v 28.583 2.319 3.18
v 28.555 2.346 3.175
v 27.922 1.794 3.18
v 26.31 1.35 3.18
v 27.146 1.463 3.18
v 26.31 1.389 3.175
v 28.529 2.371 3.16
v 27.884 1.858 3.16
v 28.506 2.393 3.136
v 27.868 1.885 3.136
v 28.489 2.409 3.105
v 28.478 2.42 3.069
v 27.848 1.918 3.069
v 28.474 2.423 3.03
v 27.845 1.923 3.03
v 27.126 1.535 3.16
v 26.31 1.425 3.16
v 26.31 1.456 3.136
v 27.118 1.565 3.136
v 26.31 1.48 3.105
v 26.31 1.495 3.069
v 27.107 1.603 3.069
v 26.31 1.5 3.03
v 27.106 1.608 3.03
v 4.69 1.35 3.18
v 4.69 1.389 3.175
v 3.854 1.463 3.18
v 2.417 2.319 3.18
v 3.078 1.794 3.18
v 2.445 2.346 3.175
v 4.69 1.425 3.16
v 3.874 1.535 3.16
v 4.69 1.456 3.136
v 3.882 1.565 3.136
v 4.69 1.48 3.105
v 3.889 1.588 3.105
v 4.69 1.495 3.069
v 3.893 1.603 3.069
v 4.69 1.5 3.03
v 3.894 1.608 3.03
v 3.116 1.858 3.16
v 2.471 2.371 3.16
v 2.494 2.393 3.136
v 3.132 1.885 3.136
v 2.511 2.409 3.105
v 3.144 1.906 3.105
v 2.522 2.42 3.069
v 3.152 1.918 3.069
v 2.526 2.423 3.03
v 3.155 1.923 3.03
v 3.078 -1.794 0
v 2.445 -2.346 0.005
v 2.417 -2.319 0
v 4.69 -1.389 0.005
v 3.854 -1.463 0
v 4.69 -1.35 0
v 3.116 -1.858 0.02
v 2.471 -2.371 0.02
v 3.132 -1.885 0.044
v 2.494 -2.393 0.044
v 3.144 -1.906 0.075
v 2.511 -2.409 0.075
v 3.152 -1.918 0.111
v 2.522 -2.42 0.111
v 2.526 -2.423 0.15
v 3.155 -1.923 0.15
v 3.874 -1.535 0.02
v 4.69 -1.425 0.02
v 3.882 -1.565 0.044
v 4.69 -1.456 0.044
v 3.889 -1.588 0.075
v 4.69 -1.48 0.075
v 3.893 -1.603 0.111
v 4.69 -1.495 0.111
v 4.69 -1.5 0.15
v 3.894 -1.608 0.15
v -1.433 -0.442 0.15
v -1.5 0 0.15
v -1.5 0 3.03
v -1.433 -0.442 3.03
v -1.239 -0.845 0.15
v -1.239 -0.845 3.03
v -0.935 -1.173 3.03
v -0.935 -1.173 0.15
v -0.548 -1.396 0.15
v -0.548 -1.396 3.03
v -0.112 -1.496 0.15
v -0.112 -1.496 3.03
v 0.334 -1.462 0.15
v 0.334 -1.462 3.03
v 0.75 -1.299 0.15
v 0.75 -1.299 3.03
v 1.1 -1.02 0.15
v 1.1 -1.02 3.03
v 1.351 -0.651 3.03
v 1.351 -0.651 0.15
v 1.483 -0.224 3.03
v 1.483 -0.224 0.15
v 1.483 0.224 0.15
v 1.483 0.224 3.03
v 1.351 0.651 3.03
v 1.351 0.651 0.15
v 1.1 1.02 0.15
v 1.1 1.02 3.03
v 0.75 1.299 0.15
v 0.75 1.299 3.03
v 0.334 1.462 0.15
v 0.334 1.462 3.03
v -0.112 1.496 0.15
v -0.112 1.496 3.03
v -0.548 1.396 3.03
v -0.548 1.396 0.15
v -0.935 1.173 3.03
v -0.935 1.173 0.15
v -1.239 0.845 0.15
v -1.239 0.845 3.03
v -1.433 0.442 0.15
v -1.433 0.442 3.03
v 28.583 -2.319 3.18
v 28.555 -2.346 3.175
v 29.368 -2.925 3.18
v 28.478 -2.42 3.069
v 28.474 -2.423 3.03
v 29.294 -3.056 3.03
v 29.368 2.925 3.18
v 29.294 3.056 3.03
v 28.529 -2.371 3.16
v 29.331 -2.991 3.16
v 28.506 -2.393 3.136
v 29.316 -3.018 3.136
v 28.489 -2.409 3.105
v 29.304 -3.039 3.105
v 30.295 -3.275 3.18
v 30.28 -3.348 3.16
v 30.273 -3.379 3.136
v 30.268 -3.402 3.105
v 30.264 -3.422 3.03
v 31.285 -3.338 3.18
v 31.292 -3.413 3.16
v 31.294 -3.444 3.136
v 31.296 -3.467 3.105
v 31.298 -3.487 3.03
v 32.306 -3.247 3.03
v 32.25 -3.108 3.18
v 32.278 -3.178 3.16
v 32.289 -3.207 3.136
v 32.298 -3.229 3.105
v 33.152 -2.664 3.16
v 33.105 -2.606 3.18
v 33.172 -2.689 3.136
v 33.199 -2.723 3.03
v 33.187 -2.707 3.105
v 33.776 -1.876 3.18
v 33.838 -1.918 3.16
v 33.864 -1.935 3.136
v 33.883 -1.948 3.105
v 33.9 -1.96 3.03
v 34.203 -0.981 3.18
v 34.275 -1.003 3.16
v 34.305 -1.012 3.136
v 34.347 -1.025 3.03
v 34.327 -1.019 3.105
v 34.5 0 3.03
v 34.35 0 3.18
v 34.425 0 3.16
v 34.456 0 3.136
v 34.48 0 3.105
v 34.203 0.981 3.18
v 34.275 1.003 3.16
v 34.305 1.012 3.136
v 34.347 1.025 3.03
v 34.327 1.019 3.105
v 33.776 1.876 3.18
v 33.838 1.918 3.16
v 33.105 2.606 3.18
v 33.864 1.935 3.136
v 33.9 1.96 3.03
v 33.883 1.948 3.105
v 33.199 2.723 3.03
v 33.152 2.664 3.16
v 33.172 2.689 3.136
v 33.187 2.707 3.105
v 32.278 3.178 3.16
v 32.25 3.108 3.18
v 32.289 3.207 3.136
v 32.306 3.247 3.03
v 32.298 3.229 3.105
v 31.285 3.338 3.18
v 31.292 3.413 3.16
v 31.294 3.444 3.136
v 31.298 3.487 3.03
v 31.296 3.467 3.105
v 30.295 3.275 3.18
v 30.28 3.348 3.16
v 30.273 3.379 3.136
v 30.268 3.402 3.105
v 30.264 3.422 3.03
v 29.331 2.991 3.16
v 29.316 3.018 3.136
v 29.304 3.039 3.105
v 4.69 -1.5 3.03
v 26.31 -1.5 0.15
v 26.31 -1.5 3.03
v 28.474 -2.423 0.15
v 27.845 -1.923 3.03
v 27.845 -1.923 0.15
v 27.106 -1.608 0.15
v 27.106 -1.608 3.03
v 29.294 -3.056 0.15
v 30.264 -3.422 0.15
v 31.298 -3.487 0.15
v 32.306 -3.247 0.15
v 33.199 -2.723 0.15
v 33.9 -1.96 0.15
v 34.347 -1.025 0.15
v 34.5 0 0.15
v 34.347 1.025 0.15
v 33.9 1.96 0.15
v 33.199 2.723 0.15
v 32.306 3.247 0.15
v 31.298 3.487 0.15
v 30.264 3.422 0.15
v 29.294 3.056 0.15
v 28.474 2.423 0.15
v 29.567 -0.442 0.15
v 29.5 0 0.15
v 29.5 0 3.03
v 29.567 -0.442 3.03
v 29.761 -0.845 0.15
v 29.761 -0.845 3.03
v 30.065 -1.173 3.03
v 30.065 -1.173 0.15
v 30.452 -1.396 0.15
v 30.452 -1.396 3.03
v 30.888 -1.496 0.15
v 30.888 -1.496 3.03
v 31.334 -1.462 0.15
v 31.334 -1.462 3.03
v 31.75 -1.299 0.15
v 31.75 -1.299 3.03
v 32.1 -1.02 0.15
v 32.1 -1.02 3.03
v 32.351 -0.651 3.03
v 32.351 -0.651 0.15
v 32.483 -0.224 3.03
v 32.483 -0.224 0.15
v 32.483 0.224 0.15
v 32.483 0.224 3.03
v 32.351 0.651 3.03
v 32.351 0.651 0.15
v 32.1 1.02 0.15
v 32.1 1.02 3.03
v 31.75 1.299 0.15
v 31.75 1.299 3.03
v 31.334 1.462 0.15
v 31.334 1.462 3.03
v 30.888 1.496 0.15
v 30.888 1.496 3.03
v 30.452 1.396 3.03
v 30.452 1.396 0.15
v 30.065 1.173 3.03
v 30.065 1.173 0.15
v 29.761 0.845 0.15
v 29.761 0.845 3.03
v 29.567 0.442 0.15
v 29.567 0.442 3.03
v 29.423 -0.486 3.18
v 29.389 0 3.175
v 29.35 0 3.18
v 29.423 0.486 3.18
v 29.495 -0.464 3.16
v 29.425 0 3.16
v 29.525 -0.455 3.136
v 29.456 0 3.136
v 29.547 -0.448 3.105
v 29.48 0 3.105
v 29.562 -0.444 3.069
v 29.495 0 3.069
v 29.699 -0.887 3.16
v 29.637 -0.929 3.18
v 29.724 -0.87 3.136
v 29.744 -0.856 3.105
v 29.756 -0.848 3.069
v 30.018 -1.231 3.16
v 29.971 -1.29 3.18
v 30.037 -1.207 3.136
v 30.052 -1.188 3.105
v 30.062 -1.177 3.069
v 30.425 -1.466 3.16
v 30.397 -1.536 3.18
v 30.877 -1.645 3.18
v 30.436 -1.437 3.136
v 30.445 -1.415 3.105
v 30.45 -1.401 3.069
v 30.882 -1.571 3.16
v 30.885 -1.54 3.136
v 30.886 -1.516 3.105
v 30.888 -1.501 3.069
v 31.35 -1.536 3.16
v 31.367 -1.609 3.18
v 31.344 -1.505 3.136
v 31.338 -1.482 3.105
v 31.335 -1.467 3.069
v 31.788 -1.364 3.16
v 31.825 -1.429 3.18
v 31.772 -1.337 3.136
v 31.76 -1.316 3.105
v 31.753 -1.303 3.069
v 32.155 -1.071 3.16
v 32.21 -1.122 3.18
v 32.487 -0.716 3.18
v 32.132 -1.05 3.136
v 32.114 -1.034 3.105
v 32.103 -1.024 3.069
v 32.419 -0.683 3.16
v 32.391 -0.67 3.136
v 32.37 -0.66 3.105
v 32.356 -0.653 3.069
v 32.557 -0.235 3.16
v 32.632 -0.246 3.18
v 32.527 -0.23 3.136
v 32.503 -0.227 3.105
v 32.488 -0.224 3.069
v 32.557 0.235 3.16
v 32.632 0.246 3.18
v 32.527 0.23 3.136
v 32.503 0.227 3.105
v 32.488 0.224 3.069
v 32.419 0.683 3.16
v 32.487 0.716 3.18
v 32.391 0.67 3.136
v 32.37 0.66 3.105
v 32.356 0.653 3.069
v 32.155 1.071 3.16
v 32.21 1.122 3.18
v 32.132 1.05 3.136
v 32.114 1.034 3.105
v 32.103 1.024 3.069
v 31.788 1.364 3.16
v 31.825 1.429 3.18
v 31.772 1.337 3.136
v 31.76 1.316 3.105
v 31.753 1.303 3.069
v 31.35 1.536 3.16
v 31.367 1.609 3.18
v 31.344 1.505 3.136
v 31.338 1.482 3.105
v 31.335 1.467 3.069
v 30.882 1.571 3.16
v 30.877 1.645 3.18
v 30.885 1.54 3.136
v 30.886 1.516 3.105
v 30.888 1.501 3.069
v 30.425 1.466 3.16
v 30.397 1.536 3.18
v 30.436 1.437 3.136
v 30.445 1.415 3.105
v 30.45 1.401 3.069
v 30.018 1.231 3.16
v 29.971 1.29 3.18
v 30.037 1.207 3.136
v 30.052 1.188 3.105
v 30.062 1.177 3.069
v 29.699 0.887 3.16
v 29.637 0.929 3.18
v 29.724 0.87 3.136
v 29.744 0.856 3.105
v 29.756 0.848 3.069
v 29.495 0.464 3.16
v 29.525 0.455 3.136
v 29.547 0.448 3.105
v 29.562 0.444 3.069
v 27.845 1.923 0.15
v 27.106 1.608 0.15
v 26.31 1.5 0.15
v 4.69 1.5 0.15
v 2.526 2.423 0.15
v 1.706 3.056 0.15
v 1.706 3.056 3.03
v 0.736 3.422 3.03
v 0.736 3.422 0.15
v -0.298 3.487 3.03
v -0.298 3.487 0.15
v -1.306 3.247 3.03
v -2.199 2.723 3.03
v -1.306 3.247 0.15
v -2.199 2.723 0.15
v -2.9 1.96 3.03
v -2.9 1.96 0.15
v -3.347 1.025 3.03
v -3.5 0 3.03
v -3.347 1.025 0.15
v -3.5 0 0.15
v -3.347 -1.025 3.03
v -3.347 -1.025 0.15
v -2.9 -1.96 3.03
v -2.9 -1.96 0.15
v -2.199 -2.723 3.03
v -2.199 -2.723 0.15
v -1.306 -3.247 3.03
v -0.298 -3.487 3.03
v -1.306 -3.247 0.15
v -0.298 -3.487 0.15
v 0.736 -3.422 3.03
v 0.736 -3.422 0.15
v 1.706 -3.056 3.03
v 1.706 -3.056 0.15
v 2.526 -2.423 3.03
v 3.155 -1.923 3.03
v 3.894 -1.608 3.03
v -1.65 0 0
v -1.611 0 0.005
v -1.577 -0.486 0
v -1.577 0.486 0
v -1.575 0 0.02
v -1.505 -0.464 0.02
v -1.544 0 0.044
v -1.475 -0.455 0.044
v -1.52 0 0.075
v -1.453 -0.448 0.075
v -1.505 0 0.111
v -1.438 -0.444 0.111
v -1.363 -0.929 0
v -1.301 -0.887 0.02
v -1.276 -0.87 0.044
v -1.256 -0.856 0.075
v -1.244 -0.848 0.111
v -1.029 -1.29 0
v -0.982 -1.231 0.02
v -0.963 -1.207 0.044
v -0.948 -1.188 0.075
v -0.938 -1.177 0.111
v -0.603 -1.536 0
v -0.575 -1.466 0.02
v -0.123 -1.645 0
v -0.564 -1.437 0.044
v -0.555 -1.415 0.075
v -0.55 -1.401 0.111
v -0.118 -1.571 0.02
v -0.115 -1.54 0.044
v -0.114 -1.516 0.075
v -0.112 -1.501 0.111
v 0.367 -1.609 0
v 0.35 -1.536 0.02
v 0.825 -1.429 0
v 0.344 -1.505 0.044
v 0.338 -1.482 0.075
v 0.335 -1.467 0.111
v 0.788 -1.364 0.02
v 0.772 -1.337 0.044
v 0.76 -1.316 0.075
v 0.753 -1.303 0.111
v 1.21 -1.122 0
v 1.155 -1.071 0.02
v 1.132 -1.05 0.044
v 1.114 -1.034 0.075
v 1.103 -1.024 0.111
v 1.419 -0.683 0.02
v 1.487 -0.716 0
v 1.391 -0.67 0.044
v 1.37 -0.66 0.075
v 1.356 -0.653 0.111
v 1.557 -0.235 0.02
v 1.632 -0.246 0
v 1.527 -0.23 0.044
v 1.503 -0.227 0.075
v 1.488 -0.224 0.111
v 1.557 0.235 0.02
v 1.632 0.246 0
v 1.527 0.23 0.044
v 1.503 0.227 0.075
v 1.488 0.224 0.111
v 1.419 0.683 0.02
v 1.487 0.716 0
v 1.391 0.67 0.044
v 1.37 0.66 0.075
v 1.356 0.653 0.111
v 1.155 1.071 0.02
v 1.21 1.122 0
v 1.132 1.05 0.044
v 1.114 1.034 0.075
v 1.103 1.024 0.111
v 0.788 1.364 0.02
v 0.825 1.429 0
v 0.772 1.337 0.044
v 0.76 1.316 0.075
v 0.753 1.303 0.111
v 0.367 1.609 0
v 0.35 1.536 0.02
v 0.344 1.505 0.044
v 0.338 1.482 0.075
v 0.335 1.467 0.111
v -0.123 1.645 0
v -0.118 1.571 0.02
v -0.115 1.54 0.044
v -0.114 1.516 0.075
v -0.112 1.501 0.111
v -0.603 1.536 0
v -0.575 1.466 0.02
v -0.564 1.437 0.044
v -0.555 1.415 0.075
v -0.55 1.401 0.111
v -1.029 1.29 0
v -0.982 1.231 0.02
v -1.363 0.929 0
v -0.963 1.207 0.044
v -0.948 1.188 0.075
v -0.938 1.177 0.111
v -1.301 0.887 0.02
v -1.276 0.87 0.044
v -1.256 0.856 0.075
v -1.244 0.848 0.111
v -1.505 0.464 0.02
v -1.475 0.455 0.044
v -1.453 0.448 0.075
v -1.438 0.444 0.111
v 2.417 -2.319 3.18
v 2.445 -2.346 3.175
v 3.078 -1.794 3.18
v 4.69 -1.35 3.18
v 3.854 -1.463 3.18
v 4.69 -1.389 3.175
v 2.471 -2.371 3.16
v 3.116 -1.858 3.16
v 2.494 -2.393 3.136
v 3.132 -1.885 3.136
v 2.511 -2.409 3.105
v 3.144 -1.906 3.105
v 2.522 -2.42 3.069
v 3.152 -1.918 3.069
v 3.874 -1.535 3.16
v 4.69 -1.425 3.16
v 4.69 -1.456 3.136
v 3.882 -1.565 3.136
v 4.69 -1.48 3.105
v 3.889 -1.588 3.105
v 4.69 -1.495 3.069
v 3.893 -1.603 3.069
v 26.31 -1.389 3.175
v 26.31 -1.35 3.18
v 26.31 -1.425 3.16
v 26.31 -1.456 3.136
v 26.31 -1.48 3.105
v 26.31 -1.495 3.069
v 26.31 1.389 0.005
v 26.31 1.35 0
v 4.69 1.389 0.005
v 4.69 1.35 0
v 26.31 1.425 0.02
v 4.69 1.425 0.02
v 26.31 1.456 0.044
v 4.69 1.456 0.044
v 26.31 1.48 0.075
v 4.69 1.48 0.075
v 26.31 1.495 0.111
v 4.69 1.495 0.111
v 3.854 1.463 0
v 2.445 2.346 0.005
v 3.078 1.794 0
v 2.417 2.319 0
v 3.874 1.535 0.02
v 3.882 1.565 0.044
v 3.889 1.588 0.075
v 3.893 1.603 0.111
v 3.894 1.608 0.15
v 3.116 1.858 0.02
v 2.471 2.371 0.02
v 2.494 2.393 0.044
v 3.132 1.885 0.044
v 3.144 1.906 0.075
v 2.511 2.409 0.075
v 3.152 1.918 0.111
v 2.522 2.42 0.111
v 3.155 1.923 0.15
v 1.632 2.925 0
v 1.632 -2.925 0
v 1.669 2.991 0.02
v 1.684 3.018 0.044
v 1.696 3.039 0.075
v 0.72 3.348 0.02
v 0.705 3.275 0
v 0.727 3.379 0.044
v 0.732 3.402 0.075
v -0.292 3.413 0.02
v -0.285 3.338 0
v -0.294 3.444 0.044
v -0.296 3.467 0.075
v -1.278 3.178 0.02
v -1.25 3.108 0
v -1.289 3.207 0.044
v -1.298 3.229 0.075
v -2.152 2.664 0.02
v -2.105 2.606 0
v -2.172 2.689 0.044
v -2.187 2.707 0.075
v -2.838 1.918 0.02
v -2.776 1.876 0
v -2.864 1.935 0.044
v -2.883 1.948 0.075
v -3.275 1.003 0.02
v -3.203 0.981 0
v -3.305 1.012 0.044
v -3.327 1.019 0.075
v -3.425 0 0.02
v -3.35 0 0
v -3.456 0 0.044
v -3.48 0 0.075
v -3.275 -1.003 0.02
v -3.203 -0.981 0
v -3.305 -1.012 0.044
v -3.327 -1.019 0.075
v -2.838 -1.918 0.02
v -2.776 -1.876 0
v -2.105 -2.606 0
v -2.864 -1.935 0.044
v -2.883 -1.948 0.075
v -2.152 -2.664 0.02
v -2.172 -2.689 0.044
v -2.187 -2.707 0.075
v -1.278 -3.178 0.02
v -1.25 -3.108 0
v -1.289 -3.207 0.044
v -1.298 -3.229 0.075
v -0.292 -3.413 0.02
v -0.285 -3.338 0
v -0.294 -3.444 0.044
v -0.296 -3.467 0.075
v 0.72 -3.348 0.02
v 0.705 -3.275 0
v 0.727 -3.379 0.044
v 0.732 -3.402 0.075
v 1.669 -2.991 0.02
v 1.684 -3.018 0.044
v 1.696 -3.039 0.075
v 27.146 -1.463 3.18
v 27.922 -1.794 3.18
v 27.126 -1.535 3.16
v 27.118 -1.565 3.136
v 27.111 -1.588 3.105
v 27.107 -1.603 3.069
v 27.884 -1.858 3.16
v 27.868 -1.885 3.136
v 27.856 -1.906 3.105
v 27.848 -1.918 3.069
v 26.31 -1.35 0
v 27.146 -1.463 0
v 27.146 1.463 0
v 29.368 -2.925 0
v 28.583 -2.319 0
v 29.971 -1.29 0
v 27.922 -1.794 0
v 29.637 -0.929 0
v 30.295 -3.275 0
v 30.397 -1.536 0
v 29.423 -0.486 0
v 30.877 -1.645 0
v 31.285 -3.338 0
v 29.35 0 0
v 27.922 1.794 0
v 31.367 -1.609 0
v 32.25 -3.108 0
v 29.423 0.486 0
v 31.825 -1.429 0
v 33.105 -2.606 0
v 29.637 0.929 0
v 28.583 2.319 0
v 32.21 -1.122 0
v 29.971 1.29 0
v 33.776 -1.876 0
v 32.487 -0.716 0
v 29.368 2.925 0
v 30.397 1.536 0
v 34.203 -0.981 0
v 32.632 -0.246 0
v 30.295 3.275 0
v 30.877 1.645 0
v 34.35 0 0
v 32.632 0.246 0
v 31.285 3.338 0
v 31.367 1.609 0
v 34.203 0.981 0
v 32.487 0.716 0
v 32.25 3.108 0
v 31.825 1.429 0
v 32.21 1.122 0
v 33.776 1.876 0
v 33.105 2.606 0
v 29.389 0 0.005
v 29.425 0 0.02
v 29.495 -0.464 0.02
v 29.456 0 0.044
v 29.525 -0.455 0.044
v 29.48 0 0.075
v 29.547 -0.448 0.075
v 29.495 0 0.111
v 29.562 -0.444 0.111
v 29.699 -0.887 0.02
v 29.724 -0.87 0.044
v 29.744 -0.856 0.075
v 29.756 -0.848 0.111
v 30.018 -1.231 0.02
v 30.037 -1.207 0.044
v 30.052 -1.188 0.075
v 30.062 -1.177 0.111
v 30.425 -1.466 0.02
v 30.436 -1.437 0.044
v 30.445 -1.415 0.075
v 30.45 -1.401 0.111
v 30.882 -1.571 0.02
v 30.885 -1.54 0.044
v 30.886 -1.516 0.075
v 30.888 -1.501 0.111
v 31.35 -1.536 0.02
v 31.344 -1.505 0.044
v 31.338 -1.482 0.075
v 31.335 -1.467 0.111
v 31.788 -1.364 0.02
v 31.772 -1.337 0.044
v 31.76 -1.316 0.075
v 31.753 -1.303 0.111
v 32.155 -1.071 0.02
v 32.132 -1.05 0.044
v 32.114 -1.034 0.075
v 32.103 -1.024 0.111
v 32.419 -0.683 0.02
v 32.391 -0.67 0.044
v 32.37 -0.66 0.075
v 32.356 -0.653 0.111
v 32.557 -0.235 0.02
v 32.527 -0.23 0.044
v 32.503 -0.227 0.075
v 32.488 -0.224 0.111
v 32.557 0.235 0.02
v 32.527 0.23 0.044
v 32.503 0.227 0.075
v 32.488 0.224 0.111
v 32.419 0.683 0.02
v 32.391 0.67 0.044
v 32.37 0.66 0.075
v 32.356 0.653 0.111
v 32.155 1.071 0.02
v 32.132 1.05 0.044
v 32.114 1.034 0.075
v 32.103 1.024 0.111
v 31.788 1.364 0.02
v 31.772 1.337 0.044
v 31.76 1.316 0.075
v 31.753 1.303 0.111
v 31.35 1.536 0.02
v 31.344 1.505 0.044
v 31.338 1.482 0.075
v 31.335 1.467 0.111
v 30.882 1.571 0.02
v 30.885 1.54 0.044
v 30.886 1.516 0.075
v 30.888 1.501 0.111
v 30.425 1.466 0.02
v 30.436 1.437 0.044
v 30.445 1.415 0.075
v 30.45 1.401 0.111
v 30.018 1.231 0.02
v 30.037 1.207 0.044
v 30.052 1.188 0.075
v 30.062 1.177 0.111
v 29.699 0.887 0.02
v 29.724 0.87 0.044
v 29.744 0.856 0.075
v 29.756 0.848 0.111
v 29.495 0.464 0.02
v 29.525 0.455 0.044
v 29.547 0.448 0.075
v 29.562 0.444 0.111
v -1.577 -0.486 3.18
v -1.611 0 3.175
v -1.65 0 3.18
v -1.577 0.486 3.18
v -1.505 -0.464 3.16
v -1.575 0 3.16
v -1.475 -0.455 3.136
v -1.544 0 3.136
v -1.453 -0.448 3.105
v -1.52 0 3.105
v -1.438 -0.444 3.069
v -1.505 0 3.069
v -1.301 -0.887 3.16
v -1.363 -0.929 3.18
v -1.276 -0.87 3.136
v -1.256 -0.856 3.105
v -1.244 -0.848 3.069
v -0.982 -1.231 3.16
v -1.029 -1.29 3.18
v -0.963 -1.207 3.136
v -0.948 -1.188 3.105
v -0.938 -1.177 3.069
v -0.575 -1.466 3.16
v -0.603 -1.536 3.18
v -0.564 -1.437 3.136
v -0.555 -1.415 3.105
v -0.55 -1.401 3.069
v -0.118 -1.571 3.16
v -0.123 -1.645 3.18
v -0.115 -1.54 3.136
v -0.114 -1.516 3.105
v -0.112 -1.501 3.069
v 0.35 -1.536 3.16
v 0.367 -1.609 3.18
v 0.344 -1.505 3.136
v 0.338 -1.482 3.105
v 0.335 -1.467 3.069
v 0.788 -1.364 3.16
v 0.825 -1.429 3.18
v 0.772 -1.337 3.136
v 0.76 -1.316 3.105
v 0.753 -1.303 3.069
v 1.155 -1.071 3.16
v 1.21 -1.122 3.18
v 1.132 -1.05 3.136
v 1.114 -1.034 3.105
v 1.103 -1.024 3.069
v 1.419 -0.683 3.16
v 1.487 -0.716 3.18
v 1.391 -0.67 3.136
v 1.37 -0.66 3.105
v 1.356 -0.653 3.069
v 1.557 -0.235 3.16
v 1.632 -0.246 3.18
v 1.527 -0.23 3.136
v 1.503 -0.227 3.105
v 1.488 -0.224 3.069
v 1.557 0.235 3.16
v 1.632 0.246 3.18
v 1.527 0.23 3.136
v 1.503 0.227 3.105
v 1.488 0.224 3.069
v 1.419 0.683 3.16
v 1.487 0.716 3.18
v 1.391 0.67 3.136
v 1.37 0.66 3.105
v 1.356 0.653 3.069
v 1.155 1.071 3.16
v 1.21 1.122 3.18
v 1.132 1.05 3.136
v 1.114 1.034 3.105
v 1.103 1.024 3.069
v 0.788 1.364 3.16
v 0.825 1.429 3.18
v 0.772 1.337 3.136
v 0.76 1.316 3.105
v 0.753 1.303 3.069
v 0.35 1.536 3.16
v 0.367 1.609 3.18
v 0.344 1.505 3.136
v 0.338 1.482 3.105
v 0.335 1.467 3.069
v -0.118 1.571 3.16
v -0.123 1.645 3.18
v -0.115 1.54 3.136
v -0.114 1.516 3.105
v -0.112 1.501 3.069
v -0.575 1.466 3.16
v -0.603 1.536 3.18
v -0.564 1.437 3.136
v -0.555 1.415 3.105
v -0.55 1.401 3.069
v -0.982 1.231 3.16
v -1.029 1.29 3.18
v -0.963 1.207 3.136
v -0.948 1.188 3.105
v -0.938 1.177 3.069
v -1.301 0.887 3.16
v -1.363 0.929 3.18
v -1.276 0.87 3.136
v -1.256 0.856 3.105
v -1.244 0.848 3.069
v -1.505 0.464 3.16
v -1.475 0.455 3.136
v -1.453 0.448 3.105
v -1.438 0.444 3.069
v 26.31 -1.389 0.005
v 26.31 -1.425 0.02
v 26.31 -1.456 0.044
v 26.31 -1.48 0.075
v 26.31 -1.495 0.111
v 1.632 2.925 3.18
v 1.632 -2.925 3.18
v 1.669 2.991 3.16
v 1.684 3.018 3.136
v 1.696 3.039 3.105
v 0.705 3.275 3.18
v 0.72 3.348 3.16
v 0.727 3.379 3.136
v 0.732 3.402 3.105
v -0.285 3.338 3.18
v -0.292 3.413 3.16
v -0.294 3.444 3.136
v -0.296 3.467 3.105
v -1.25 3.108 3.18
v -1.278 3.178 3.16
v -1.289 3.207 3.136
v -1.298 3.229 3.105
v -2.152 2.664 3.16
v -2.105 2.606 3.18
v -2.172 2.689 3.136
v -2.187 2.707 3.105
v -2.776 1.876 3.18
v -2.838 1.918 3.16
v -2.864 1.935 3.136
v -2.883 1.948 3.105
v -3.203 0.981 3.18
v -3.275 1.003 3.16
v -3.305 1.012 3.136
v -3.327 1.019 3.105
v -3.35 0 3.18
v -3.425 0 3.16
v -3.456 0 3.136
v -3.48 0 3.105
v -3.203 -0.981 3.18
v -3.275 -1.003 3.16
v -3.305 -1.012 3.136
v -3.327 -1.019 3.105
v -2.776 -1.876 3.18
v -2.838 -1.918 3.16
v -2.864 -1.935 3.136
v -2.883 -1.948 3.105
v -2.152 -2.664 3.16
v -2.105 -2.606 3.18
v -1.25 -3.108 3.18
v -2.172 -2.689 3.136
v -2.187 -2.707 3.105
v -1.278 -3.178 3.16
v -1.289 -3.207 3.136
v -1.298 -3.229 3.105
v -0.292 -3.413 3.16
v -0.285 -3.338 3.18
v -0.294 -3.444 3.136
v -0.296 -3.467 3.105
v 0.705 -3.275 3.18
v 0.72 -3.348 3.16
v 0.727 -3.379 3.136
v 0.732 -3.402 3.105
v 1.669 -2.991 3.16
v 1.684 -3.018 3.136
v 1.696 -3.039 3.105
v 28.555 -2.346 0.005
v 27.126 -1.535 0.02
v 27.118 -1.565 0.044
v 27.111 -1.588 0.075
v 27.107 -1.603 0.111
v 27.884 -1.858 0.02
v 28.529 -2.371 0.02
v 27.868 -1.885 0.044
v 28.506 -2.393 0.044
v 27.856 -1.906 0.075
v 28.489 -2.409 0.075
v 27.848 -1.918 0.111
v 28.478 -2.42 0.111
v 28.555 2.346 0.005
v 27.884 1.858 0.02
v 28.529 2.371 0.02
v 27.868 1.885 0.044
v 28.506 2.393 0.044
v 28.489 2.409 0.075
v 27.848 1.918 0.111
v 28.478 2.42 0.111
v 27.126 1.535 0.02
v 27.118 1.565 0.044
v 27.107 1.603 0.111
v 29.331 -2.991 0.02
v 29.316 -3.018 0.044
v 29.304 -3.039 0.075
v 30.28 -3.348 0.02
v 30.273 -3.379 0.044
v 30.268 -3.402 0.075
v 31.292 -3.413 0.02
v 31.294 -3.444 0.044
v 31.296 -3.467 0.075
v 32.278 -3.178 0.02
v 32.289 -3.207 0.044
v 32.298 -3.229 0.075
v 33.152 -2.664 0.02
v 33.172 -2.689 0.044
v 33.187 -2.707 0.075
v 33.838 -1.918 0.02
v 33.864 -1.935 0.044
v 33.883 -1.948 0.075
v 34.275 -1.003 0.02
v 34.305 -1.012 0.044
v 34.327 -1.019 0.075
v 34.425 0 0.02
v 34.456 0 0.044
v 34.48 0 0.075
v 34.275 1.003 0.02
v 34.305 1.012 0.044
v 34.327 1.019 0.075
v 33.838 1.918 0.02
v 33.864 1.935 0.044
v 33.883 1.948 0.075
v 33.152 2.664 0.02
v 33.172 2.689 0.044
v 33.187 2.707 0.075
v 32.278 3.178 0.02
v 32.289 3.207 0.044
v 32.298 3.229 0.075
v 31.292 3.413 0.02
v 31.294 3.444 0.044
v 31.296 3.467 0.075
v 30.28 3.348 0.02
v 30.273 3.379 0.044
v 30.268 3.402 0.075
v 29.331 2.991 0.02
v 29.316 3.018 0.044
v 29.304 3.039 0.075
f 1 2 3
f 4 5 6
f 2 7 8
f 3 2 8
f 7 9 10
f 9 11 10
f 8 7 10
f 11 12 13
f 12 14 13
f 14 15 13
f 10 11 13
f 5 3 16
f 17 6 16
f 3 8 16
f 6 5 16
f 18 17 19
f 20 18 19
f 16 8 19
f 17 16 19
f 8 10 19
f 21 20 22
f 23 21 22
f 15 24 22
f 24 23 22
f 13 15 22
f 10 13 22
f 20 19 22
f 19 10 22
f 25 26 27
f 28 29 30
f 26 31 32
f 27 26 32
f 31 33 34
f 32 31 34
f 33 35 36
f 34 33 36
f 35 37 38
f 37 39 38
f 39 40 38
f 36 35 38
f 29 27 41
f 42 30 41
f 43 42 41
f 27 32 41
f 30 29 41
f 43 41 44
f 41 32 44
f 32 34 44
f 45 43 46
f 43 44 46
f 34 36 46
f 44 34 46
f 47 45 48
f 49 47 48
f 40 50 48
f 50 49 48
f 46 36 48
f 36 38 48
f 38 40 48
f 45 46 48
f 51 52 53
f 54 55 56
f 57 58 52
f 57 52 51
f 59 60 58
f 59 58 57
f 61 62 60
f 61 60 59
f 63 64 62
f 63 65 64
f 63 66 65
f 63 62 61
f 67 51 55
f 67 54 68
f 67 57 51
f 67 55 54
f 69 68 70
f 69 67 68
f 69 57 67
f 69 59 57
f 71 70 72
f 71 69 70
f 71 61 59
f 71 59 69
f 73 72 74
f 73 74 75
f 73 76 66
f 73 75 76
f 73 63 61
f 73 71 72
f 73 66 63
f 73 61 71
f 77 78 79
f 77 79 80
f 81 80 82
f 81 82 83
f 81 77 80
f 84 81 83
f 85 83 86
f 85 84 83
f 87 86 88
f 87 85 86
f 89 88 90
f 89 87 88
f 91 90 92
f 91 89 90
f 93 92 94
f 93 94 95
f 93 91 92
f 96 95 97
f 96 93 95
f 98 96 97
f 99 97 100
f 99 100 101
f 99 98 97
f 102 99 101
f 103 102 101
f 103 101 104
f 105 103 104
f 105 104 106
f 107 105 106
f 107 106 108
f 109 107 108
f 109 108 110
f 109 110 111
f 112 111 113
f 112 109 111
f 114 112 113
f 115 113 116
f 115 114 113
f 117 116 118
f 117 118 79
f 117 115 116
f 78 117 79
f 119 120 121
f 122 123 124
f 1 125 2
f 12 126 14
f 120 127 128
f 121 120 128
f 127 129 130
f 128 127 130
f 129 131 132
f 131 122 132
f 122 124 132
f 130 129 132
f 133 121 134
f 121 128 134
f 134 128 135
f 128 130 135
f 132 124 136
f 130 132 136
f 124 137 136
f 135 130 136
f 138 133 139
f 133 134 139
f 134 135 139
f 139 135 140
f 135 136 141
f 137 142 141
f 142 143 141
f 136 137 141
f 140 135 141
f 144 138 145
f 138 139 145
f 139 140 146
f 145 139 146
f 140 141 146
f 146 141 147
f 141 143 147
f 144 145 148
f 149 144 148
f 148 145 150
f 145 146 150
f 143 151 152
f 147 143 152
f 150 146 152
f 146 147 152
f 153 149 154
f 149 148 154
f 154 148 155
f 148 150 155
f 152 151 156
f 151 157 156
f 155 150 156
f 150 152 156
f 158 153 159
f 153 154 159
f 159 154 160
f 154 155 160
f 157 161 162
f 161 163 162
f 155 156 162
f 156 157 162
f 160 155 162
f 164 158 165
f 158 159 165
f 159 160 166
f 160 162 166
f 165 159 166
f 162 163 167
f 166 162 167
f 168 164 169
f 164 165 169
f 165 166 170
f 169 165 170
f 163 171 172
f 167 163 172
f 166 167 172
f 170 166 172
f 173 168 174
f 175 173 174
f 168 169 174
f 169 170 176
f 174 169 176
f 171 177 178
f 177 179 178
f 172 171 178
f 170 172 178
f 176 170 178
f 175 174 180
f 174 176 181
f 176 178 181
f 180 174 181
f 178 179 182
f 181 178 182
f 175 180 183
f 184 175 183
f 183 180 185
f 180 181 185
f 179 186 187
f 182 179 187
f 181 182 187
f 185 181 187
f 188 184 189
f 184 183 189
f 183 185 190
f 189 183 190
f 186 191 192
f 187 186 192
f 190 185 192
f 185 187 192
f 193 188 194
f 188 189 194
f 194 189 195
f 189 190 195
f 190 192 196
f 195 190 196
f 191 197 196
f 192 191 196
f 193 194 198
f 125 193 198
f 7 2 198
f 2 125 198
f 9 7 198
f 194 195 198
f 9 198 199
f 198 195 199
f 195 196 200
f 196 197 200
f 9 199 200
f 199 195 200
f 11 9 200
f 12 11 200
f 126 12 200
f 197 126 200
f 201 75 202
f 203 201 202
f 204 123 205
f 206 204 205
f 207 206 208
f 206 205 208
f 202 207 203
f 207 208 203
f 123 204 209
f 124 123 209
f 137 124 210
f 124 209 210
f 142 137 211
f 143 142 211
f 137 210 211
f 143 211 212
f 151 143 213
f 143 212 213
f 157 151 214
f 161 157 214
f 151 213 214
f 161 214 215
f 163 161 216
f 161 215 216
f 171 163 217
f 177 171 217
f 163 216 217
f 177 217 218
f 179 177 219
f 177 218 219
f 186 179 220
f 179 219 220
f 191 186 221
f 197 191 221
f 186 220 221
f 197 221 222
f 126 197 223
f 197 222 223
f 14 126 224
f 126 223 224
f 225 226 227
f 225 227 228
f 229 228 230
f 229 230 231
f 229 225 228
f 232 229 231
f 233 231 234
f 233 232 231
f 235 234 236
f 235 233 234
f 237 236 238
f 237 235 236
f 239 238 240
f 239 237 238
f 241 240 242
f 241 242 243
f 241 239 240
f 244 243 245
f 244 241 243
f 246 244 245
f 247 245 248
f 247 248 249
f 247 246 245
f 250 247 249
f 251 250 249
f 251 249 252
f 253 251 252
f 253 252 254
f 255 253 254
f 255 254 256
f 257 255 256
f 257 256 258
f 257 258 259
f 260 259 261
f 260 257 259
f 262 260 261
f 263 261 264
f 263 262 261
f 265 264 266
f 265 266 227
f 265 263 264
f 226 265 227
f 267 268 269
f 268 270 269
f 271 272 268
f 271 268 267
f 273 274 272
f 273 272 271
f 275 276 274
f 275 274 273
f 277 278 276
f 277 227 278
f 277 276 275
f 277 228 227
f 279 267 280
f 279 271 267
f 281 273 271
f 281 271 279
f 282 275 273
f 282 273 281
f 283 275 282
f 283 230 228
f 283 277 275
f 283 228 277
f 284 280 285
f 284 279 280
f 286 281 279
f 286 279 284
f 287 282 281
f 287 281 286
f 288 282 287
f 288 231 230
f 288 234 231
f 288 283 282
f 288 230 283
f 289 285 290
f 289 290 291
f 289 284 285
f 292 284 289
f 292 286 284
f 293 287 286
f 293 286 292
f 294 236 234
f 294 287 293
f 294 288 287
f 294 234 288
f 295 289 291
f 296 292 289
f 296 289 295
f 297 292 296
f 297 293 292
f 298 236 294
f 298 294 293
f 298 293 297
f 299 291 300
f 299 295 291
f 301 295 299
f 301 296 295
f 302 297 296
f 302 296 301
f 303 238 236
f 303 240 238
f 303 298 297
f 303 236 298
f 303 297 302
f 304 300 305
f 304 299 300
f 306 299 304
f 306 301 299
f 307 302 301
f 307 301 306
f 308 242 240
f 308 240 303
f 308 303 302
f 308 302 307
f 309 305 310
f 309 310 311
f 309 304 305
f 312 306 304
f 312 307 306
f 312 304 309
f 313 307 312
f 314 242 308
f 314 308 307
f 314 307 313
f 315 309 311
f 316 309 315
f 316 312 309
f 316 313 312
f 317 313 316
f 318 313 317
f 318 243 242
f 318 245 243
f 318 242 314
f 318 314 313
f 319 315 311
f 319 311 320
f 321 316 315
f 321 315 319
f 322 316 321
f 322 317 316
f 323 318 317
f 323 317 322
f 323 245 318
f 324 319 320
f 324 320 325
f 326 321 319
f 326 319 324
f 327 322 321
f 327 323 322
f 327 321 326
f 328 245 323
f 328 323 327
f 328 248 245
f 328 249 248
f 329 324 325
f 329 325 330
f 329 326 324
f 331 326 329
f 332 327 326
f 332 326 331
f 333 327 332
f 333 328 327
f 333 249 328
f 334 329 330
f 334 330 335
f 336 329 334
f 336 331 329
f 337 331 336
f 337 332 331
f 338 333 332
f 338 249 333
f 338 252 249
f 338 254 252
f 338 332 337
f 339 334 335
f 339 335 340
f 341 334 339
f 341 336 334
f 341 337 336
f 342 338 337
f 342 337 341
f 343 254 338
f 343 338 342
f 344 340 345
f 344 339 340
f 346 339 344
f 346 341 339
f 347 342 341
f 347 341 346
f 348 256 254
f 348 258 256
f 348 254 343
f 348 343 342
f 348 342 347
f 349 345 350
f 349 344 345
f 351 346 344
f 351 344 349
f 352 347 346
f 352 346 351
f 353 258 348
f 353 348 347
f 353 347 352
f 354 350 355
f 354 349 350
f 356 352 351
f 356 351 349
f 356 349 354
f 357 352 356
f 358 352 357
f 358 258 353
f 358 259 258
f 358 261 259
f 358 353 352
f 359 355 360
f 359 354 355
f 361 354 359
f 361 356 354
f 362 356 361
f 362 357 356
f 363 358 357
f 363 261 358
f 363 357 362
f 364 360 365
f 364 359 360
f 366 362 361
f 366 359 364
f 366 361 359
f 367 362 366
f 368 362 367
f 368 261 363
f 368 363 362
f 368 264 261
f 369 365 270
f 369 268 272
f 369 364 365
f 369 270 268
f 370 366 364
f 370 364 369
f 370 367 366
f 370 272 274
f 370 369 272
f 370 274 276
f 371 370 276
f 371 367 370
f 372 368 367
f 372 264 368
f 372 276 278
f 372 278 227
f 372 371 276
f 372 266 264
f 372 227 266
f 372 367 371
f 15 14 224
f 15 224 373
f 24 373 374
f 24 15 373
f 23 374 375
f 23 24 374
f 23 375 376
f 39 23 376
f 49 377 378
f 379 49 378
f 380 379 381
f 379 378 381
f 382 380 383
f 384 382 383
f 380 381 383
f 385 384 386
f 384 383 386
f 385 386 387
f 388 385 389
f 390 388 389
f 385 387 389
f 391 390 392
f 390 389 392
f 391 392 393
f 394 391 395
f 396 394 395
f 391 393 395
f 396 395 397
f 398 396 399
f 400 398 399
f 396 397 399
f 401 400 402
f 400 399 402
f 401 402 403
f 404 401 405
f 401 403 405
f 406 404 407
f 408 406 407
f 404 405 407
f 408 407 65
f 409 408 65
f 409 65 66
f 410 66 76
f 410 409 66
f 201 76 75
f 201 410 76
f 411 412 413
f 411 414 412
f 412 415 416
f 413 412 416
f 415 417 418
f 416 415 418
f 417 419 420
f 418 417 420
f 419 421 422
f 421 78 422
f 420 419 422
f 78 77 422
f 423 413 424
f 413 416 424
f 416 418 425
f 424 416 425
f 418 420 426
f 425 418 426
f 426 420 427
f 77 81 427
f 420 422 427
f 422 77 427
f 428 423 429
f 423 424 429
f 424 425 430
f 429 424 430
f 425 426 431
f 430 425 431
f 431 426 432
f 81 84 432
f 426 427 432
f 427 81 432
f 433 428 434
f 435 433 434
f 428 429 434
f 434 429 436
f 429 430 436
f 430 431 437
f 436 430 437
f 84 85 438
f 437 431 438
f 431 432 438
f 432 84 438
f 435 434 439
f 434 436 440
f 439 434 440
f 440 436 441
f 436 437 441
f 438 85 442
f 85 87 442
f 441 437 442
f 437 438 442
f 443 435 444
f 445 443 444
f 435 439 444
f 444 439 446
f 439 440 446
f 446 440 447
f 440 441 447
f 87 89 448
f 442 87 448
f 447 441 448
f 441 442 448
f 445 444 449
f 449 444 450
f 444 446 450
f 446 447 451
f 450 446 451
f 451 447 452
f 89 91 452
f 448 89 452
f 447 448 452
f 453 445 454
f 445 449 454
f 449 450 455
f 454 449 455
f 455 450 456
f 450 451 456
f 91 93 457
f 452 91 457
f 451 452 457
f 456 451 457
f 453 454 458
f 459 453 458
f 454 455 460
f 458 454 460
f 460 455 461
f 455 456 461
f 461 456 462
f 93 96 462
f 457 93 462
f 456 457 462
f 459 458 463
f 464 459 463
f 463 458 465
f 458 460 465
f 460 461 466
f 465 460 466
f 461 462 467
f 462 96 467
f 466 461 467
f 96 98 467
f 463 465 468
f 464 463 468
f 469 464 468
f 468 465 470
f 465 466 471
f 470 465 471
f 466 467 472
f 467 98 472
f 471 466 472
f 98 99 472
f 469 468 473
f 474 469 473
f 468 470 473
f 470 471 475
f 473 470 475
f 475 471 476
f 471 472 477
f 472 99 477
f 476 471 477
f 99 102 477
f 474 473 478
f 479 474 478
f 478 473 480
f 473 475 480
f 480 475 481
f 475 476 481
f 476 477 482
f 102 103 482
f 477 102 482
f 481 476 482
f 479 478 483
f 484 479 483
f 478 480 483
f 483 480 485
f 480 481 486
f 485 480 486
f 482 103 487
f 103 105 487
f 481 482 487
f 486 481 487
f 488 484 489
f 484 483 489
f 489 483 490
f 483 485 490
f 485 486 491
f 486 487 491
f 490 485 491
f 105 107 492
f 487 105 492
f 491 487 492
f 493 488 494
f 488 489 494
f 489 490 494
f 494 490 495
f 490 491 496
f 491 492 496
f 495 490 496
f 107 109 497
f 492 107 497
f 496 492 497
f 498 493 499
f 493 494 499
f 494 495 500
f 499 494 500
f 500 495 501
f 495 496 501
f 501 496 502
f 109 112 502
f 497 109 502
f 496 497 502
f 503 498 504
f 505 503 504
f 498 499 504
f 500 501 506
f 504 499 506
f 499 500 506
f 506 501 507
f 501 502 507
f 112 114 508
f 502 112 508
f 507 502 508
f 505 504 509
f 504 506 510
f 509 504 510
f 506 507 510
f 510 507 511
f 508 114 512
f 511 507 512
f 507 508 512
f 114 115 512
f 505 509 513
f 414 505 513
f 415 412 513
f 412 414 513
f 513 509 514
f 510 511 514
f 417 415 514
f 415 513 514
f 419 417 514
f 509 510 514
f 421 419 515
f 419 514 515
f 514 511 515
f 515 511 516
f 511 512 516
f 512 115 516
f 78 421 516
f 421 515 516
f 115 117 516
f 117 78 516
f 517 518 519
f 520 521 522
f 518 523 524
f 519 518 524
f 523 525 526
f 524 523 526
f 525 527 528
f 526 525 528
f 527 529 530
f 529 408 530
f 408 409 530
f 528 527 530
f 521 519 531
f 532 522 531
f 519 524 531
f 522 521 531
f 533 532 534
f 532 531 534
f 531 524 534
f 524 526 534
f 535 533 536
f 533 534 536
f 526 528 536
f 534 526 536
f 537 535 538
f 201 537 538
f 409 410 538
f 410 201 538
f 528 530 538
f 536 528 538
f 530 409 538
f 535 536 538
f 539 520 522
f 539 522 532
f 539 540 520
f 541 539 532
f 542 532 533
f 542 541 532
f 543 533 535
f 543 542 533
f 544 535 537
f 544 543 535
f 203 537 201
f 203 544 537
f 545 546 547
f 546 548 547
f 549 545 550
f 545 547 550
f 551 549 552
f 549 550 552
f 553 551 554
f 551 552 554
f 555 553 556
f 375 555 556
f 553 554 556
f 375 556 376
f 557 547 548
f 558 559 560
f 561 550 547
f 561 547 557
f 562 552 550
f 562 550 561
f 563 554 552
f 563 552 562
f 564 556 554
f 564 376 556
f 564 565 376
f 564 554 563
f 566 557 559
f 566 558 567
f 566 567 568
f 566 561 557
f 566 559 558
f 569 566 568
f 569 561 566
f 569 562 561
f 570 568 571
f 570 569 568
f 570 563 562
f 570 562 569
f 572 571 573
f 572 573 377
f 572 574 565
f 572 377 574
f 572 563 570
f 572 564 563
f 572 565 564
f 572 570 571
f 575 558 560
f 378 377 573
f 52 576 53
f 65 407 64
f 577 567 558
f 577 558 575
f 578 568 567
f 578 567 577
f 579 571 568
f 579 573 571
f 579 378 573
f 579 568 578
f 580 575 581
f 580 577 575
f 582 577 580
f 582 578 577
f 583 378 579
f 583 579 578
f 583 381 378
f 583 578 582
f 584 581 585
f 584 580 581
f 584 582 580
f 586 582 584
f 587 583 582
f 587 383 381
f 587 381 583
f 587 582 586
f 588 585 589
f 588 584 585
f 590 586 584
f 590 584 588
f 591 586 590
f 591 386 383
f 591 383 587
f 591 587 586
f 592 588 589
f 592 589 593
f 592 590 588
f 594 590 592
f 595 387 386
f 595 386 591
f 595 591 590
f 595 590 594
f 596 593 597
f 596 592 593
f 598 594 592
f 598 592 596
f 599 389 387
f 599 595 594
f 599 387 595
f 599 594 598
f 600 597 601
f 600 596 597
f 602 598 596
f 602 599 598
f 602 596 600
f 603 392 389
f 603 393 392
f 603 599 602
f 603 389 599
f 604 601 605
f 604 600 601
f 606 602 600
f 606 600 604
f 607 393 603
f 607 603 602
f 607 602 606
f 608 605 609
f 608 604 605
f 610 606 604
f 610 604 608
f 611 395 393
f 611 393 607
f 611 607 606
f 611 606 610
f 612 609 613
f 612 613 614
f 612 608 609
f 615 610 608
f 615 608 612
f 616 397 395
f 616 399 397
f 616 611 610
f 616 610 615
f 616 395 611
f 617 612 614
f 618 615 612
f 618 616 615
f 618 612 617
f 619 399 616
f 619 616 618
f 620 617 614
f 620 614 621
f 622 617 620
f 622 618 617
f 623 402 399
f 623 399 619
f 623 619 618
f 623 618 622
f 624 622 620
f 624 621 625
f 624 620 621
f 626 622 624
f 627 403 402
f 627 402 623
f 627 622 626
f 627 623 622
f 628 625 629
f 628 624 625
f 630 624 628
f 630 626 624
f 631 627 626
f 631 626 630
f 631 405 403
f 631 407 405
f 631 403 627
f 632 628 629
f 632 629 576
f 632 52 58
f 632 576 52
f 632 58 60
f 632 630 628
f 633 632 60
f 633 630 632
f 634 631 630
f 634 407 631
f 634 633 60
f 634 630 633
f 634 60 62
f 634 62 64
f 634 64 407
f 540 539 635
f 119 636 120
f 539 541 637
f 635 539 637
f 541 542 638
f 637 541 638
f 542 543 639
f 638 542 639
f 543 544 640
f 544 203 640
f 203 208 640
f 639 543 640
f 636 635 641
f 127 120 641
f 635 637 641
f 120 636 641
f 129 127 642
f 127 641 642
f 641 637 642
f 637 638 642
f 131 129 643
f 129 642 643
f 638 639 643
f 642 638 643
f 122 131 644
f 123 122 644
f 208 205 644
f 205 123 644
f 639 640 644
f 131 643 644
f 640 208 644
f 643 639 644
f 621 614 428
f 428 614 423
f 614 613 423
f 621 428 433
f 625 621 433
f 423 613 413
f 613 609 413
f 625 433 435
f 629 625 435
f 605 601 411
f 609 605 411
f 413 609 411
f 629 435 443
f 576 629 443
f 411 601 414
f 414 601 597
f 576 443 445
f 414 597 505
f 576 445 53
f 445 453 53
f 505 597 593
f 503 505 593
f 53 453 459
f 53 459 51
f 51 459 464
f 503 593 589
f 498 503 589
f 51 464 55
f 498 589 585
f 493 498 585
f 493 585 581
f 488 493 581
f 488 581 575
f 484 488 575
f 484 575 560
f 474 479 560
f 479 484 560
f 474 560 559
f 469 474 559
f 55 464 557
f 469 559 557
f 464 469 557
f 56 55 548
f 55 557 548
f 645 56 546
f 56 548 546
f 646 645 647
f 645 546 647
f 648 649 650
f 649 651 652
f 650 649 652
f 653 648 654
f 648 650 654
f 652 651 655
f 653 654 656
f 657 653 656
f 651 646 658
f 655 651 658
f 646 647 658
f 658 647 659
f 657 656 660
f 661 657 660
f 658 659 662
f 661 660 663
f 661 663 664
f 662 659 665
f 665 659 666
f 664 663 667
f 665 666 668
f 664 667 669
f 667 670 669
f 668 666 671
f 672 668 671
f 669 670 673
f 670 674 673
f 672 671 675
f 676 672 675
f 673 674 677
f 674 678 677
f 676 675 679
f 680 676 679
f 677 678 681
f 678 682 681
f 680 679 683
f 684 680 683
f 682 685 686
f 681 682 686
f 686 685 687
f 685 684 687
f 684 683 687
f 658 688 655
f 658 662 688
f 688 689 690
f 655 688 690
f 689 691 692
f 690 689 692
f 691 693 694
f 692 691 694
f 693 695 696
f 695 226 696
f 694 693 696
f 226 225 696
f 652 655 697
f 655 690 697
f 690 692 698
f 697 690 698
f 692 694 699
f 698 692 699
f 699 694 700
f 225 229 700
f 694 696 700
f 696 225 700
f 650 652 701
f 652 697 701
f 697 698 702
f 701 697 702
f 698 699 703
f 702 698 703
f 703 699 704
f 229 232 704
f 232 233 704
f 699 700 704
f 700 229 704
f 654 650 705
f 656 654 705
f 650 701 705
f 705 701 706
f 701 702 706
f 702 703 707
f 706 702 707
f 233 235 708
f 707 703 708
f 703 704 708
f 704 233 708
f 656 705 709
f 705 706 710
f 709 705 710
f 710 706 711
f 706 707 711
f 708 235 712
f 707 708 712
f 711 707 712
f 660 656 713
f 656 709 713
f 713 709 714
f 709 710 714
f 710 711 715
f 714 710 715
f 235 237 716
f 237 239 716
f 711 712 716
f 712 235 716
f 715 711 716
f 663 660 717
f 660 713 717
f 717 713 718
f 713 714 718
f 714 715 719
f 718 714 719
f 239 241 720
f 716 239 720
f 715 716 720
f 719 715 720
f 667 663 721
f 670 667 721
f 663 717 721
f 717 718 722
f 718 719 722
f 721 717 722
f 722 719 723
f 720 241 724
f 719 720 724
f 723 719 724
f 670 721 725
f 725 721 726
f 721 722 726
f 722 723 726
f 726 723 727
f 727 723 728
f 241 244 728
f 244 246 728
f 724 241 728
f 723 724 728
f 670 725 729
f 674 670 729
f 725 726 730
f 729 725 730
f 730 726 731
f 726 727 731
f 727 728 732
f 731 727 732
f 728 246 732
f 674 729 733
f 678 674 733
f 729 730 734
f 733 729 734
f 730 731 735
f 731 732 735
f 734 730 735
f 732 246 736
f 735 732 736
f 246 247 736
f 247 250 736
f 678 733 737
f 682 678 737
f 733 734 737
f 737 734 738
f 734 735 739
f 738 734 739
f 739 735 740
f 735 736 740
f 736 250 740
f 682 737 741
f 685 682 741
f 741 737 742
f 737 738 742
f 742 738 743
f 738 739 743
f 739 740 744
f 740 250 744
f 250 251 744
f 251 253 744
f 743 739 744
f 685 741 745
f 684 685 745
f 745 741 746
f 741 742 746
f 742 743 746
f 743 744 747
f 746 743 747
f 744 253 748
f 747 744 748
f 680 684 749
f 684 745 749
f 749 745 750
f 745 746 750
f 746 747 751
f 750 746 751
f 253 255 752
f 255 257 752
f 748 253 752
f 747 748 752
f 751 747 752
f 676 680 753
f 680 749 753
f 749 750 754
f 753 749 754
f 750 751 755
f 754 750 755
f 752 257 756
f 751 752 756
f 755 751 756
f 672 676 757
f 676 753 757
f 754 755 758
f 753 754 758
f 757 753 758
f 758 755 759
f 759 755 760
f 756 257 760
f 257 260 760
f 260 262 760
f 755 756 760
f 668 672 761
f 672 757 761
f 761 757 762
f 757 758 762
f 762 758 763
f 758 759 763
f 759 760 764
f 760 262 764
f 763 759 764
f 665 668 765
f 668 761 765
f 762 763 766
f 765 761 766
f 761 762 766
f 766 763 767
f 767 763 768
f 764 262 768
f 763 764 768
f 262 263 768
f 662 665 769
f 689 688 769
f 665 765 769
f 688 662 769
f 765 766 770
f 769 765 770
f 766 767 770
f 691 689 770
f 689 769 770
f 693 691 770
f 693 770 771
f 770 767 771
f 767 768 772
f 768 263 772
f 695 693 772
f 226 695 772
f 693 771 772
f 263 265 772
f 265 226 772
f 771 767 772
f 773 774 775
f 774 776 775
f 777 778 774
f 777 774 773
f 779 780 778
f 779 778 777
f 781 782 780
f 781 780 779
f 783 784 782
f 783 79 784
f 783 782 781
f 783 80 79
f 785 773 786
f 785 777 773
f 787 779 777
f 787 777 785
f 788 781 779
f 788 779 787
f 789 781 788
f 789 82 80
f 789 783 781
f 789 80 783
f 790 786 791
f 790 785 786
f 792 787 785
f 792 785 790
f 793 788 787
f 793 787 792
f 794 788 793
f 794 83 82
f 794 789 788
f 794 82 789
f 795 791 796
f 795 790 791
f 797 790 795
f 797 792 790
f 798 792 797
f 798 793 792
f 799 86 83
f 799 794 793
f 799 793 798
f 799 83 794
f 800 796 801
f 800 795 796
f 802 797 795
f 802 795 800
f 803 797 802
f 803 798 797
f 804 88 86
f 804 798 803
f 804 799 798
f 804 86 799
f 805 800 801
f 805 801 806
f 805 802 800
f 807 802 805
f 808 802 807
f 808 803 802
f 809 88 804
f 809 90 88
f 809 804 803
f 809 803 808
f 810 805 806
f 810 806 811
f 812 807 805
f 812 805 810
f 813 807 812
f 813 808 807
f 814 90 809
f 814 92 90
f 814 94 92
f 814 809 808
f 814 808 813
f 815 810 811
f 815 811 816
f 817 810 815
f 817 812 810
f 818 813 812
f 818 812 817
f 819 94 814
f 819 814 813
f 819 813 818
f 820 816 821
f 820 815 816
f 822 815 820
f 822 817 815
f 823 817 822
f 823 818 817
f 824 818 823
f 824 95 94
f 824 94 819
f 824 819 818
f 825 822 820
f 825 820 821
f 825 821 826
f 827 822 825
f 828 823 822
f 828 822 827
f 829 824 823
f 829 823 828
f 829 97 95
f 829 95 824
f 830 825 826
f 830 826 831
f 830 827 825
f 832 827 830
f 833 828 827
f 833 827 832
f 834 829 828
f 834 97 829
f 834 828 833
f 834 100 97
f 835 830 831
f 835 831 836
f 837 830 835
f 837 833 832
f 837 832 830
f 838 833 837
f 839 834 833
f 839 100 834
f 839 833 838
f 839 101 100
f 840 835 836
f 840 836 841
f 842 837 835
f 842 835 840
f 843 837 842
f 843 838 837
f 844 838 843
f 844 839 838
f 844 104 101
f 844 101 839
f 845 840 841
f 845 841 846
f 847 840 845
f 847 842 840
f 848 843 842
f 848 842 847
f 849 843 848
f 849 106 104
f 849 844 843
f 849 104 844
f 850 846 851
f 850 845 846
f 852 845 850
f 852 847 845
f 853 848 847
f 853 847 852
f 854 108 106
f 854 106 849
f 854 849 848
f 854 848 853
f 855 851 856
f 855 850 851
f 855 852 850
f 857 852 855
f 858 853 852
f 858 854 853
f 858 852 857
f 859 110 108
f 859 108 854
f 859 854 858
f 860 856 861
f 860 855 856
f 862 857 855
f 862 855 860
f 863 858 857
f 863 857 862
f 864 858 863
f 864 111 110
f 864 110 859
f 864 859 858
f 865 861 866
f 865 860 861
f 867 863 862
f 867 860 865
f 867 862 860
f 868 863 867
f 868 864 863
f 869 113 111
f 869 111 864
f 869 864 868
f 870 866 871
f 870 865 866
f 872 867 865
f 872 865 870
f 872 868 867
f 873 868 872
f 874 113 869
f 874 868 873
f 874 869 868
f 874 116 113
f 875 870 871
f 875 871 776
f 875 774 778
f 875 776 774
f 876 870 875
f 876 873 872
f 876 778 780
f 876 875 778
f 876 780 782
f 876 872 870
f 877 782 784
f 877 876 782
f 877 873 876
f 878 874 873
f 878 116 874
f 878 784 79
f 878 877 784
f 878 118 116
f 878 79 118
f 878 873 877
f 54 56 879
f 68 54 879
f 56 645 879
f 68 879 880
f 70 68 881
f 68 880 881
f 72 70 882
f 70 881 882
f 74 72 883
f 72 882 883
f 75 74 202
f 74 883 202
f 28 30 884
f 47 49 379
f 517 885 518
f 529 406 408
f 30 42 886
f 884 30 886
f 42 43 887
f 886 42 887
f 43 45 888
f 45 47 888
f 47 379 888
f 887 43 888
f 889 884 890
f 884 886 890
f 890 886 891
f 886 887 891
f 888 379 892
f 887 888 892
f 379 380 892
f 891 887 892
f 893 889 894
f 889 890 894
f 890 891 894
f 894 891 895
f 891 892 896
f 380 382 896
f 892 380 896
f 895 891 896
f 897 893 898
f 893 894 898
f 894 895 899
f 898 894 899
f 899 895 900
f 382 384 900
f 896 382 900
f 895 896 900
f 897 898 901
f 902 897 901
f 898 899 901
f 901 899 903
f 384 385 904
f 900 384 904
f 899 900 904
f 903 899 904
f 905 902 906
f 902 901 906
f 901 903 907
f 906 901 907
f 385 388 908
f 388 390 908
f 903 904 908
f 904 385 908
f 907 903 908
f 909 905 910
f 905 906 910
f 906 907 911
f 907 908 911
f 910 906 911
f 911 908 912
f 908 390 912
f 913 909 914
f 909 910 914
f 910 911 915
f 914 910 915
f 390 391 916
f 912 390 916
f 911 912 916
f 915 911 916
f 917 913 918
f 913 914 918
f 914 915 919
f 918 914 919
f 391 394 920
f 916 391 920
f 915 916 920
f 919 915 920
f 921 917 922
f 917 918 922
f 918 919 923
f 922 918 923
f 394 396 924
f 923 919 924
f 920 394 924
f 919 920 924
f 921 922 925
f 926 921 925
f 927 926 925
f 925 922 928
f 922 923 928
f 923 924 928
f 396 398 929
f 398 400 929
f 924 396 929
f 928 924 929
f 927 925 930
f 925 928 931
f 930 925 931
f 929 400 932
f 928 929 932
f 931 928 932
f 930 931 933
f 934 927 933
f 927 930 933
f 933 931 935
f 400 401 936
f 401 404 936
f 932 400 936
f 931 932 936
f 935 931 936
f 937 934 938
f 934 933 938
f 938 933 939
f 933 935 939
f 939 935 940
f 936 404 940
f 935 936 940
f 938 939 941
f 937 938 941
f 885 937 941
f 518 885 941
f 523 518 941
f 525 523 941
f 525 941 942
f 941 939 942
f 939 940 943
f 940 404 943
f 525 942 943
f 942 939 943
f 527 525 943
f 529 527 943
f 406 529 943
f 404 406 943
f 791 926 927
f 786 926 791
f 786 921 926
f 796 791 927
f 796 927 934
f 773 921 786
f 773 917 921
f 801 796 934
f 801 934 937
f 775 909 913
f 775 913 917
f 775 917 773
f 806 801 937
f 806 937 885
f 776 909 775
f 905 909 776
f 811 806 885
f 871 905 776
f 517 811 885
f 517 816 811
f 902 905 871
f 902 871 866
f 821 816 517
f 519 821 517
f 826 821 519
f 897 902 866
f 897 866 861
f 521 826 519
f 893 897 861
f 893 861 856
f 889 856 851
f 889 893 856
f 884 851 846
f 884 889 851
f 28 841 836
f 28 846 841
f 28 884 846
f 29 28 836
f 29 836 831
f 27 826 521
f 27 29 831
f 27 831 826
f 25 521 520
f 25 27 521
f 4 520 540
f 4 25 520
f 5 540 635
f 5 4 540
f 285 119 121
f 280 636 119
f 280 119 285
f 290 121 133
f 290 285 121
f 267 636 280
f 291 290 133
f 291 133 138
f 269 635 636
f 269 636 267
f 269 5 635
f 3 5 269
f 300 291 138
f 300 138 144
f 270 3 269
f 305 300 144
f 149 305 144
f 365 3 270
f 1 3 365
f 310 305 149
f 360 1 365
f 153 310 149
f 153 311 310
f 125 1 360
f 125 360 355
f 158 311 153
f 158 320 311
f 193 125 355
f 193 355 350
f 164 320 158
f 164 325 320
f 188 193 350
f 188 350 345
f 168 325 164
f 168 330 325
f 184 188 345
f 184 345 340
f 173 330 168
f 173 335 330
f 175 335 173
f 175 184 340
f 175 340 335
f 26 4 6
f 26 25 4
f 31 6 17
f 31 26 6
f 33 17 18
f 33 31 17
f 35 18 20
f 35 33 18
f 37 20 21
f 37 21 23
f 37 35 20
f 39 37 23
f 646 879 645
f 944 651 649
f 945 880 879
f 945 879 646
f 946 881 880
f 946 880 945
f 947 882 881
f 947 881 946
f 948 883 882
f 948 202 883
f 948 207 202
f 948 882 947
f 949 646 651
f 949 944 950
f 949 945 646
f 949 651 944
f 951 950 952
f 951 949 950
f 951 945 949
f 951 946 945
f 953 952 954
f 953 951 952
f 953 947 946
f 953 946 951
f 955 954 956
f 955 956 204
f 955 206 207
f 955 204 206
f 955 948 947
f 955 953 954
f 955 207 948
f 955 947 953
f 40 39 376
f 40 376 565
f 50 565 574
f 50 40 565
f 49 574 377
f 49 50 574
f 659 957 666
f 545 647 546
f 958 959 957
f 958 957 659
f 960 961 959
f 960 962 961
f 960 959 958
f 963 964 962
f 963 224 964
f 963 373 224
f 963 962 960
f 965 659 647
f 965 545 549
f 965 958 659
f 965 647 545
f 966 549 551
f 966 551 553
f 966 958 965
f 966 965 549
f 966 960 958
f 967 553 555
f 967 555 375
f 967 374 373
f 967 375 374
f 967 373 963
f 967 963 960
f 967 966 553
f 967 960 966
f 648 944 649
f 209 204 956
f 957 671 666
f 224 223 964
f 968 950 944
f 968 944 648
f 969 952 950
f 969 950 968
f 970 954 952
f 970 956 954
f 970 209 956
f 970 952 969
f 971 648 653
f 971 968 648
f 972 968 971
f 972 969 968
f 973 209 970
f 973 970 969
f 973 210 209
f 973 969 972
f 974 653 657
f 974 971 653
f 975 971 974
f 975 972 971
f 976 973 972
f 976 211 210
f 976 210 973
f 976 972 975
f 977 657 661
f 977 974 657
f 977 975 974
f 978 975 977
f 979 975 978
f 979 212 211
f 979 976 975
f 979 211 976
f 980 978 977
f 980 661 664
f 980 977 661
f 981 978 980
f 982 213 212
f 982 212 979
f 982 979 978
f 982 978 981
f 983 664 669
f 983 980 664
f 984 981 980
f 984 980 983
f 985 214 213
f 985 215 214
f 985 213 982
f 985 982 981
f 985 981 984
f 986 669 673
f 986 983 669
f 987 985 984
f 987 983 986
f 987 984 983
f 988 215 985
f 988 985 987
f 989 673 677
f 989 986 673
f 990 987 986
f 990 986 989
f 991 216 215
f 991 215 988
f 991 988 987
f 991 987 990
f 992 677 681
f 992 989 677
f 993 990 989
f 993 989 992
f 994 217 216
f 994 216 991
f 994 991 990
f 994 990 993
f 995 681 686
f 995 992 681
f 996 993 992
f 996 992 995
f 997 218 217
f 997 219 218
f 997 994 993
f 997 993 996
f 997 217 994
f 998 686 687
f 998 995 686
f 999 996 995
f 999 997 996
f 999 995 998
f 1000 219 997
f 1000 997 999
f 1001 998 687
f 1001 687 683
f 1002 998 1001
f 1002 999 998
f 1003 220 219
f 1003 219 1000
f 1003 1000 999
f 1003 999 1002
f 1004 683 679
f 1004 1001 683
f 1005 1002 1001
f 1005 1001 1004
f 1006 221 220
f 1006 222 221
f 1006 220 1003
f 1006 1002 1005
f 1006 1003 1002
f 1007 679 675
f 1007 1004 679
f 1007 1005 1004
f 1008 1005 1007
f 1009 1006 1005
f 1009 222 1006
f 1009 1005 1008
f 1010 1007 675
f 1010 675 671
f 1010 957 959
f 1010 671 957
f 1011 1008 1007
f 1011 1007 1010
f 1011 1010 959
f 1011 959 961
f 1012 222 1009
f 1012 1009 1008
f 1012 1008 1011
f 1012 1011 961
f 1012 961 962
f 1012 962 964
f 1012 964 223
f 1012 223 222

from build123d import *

# Parameters (mm, degrees)
SKETCH1_R           = 3.5
SKETCH1_R_2         = 1.5
BOSS_EXTRUDE1_DEPTH = 3.18
FILLET1_R           = 3
FILLET2_R           = 0.15


with BuildPart() as part:
    # Sketch1 → Boss-Extrude1 (new body)
    # profile 1 of 3: a face of its own
    with BuildSketch(Plane.XY):
        Circle(SKETCH1_R)
        with Locations(Location((0, 0, 0), (0, 0, 180))):
            Circle(SKETCH1_R_2, mode=Mode.SUBTRACT)
    # profile 2 of 3: a face of its own
    with BuildSketch(Plane.XY):
        with BuildLine():
            ThreePointArc((27.83772234, -1.5), (27.5, 0), (27.83772234, 1.5))
            Line((27.83772234, 1.5), (3.16227766, 1.5))
            ThreePointArc((3.16227766, 1.5), (3.414525722, 0.768774411), (3.5, 0))
            ThreePointArc((3.5, 0), (3.414525722, -0.768774411), (3.16227766, -1.5))
            Line((3.16227766, -1.5), (27.83772234, -1.5))
        make_face()
    # profile 3 of 3: a face of its own
    with BuildSketch(Plane.XY):
        with Locations((31, 0)):
            Circle(SKETCH1_R)
        with Locations(Location((31, 0, 0), (0, 0, 180))):
            Circle(SKETCH1_R_2, mode=Mode.SUBTRACT)
    extrude(amount=BOSS_EXTRUDE1_DEPTH)

    # Fillet1
    fillet1_edges = [part.edges().sort_by_distance(p)[0] for p in [
        (27.83772234, 1.5, 1.59),
        (27.83772234, -1.5, 1.59),
        (3.16227766, -1.5, 1.59),
        (3.16227766, 1.5, 1.59),
    ]]
    fillet(fillet1_edges, radius=FILLET1_R)

    # Fillet2
    fillet2_edges = [part.edges().sort_by_distance(p)[0] for p in [
        (15.5, 1.5, 0),
        (15.5, 1.5, 3.18),
        (1.5, 0, 3.18),
        (34.5, 0, 0),
        (34.5, 0, 3.18),
        (-3.5, 0, 0),
        (-3.5, 0, 3.18),
        (32.5, 0, 3.18),
        (15.5, -1.5, 0),
        (15.5, -1.5, 3.18),
        (27.486281051, 1.740401367, 0),
        (27.486281051, 1.740401367, 3.18),
        (3.513718949, 1.740401367, 0),
        (3.513718949, 1.740401367, 3.18),
        (27.486281051, -1.740401367, 0),
        (27.486281051, -1.740401367, 3.18),
        (3.513718949, -1.740401367, 0),
        (3.513718949, -1.740401367, 3.18),
        (32.5, 0, 0),
        (1.5, 0, 0),
    ]]
    fillet(fillet2_edges, radius=FILLET2_R)


solid = part.part
